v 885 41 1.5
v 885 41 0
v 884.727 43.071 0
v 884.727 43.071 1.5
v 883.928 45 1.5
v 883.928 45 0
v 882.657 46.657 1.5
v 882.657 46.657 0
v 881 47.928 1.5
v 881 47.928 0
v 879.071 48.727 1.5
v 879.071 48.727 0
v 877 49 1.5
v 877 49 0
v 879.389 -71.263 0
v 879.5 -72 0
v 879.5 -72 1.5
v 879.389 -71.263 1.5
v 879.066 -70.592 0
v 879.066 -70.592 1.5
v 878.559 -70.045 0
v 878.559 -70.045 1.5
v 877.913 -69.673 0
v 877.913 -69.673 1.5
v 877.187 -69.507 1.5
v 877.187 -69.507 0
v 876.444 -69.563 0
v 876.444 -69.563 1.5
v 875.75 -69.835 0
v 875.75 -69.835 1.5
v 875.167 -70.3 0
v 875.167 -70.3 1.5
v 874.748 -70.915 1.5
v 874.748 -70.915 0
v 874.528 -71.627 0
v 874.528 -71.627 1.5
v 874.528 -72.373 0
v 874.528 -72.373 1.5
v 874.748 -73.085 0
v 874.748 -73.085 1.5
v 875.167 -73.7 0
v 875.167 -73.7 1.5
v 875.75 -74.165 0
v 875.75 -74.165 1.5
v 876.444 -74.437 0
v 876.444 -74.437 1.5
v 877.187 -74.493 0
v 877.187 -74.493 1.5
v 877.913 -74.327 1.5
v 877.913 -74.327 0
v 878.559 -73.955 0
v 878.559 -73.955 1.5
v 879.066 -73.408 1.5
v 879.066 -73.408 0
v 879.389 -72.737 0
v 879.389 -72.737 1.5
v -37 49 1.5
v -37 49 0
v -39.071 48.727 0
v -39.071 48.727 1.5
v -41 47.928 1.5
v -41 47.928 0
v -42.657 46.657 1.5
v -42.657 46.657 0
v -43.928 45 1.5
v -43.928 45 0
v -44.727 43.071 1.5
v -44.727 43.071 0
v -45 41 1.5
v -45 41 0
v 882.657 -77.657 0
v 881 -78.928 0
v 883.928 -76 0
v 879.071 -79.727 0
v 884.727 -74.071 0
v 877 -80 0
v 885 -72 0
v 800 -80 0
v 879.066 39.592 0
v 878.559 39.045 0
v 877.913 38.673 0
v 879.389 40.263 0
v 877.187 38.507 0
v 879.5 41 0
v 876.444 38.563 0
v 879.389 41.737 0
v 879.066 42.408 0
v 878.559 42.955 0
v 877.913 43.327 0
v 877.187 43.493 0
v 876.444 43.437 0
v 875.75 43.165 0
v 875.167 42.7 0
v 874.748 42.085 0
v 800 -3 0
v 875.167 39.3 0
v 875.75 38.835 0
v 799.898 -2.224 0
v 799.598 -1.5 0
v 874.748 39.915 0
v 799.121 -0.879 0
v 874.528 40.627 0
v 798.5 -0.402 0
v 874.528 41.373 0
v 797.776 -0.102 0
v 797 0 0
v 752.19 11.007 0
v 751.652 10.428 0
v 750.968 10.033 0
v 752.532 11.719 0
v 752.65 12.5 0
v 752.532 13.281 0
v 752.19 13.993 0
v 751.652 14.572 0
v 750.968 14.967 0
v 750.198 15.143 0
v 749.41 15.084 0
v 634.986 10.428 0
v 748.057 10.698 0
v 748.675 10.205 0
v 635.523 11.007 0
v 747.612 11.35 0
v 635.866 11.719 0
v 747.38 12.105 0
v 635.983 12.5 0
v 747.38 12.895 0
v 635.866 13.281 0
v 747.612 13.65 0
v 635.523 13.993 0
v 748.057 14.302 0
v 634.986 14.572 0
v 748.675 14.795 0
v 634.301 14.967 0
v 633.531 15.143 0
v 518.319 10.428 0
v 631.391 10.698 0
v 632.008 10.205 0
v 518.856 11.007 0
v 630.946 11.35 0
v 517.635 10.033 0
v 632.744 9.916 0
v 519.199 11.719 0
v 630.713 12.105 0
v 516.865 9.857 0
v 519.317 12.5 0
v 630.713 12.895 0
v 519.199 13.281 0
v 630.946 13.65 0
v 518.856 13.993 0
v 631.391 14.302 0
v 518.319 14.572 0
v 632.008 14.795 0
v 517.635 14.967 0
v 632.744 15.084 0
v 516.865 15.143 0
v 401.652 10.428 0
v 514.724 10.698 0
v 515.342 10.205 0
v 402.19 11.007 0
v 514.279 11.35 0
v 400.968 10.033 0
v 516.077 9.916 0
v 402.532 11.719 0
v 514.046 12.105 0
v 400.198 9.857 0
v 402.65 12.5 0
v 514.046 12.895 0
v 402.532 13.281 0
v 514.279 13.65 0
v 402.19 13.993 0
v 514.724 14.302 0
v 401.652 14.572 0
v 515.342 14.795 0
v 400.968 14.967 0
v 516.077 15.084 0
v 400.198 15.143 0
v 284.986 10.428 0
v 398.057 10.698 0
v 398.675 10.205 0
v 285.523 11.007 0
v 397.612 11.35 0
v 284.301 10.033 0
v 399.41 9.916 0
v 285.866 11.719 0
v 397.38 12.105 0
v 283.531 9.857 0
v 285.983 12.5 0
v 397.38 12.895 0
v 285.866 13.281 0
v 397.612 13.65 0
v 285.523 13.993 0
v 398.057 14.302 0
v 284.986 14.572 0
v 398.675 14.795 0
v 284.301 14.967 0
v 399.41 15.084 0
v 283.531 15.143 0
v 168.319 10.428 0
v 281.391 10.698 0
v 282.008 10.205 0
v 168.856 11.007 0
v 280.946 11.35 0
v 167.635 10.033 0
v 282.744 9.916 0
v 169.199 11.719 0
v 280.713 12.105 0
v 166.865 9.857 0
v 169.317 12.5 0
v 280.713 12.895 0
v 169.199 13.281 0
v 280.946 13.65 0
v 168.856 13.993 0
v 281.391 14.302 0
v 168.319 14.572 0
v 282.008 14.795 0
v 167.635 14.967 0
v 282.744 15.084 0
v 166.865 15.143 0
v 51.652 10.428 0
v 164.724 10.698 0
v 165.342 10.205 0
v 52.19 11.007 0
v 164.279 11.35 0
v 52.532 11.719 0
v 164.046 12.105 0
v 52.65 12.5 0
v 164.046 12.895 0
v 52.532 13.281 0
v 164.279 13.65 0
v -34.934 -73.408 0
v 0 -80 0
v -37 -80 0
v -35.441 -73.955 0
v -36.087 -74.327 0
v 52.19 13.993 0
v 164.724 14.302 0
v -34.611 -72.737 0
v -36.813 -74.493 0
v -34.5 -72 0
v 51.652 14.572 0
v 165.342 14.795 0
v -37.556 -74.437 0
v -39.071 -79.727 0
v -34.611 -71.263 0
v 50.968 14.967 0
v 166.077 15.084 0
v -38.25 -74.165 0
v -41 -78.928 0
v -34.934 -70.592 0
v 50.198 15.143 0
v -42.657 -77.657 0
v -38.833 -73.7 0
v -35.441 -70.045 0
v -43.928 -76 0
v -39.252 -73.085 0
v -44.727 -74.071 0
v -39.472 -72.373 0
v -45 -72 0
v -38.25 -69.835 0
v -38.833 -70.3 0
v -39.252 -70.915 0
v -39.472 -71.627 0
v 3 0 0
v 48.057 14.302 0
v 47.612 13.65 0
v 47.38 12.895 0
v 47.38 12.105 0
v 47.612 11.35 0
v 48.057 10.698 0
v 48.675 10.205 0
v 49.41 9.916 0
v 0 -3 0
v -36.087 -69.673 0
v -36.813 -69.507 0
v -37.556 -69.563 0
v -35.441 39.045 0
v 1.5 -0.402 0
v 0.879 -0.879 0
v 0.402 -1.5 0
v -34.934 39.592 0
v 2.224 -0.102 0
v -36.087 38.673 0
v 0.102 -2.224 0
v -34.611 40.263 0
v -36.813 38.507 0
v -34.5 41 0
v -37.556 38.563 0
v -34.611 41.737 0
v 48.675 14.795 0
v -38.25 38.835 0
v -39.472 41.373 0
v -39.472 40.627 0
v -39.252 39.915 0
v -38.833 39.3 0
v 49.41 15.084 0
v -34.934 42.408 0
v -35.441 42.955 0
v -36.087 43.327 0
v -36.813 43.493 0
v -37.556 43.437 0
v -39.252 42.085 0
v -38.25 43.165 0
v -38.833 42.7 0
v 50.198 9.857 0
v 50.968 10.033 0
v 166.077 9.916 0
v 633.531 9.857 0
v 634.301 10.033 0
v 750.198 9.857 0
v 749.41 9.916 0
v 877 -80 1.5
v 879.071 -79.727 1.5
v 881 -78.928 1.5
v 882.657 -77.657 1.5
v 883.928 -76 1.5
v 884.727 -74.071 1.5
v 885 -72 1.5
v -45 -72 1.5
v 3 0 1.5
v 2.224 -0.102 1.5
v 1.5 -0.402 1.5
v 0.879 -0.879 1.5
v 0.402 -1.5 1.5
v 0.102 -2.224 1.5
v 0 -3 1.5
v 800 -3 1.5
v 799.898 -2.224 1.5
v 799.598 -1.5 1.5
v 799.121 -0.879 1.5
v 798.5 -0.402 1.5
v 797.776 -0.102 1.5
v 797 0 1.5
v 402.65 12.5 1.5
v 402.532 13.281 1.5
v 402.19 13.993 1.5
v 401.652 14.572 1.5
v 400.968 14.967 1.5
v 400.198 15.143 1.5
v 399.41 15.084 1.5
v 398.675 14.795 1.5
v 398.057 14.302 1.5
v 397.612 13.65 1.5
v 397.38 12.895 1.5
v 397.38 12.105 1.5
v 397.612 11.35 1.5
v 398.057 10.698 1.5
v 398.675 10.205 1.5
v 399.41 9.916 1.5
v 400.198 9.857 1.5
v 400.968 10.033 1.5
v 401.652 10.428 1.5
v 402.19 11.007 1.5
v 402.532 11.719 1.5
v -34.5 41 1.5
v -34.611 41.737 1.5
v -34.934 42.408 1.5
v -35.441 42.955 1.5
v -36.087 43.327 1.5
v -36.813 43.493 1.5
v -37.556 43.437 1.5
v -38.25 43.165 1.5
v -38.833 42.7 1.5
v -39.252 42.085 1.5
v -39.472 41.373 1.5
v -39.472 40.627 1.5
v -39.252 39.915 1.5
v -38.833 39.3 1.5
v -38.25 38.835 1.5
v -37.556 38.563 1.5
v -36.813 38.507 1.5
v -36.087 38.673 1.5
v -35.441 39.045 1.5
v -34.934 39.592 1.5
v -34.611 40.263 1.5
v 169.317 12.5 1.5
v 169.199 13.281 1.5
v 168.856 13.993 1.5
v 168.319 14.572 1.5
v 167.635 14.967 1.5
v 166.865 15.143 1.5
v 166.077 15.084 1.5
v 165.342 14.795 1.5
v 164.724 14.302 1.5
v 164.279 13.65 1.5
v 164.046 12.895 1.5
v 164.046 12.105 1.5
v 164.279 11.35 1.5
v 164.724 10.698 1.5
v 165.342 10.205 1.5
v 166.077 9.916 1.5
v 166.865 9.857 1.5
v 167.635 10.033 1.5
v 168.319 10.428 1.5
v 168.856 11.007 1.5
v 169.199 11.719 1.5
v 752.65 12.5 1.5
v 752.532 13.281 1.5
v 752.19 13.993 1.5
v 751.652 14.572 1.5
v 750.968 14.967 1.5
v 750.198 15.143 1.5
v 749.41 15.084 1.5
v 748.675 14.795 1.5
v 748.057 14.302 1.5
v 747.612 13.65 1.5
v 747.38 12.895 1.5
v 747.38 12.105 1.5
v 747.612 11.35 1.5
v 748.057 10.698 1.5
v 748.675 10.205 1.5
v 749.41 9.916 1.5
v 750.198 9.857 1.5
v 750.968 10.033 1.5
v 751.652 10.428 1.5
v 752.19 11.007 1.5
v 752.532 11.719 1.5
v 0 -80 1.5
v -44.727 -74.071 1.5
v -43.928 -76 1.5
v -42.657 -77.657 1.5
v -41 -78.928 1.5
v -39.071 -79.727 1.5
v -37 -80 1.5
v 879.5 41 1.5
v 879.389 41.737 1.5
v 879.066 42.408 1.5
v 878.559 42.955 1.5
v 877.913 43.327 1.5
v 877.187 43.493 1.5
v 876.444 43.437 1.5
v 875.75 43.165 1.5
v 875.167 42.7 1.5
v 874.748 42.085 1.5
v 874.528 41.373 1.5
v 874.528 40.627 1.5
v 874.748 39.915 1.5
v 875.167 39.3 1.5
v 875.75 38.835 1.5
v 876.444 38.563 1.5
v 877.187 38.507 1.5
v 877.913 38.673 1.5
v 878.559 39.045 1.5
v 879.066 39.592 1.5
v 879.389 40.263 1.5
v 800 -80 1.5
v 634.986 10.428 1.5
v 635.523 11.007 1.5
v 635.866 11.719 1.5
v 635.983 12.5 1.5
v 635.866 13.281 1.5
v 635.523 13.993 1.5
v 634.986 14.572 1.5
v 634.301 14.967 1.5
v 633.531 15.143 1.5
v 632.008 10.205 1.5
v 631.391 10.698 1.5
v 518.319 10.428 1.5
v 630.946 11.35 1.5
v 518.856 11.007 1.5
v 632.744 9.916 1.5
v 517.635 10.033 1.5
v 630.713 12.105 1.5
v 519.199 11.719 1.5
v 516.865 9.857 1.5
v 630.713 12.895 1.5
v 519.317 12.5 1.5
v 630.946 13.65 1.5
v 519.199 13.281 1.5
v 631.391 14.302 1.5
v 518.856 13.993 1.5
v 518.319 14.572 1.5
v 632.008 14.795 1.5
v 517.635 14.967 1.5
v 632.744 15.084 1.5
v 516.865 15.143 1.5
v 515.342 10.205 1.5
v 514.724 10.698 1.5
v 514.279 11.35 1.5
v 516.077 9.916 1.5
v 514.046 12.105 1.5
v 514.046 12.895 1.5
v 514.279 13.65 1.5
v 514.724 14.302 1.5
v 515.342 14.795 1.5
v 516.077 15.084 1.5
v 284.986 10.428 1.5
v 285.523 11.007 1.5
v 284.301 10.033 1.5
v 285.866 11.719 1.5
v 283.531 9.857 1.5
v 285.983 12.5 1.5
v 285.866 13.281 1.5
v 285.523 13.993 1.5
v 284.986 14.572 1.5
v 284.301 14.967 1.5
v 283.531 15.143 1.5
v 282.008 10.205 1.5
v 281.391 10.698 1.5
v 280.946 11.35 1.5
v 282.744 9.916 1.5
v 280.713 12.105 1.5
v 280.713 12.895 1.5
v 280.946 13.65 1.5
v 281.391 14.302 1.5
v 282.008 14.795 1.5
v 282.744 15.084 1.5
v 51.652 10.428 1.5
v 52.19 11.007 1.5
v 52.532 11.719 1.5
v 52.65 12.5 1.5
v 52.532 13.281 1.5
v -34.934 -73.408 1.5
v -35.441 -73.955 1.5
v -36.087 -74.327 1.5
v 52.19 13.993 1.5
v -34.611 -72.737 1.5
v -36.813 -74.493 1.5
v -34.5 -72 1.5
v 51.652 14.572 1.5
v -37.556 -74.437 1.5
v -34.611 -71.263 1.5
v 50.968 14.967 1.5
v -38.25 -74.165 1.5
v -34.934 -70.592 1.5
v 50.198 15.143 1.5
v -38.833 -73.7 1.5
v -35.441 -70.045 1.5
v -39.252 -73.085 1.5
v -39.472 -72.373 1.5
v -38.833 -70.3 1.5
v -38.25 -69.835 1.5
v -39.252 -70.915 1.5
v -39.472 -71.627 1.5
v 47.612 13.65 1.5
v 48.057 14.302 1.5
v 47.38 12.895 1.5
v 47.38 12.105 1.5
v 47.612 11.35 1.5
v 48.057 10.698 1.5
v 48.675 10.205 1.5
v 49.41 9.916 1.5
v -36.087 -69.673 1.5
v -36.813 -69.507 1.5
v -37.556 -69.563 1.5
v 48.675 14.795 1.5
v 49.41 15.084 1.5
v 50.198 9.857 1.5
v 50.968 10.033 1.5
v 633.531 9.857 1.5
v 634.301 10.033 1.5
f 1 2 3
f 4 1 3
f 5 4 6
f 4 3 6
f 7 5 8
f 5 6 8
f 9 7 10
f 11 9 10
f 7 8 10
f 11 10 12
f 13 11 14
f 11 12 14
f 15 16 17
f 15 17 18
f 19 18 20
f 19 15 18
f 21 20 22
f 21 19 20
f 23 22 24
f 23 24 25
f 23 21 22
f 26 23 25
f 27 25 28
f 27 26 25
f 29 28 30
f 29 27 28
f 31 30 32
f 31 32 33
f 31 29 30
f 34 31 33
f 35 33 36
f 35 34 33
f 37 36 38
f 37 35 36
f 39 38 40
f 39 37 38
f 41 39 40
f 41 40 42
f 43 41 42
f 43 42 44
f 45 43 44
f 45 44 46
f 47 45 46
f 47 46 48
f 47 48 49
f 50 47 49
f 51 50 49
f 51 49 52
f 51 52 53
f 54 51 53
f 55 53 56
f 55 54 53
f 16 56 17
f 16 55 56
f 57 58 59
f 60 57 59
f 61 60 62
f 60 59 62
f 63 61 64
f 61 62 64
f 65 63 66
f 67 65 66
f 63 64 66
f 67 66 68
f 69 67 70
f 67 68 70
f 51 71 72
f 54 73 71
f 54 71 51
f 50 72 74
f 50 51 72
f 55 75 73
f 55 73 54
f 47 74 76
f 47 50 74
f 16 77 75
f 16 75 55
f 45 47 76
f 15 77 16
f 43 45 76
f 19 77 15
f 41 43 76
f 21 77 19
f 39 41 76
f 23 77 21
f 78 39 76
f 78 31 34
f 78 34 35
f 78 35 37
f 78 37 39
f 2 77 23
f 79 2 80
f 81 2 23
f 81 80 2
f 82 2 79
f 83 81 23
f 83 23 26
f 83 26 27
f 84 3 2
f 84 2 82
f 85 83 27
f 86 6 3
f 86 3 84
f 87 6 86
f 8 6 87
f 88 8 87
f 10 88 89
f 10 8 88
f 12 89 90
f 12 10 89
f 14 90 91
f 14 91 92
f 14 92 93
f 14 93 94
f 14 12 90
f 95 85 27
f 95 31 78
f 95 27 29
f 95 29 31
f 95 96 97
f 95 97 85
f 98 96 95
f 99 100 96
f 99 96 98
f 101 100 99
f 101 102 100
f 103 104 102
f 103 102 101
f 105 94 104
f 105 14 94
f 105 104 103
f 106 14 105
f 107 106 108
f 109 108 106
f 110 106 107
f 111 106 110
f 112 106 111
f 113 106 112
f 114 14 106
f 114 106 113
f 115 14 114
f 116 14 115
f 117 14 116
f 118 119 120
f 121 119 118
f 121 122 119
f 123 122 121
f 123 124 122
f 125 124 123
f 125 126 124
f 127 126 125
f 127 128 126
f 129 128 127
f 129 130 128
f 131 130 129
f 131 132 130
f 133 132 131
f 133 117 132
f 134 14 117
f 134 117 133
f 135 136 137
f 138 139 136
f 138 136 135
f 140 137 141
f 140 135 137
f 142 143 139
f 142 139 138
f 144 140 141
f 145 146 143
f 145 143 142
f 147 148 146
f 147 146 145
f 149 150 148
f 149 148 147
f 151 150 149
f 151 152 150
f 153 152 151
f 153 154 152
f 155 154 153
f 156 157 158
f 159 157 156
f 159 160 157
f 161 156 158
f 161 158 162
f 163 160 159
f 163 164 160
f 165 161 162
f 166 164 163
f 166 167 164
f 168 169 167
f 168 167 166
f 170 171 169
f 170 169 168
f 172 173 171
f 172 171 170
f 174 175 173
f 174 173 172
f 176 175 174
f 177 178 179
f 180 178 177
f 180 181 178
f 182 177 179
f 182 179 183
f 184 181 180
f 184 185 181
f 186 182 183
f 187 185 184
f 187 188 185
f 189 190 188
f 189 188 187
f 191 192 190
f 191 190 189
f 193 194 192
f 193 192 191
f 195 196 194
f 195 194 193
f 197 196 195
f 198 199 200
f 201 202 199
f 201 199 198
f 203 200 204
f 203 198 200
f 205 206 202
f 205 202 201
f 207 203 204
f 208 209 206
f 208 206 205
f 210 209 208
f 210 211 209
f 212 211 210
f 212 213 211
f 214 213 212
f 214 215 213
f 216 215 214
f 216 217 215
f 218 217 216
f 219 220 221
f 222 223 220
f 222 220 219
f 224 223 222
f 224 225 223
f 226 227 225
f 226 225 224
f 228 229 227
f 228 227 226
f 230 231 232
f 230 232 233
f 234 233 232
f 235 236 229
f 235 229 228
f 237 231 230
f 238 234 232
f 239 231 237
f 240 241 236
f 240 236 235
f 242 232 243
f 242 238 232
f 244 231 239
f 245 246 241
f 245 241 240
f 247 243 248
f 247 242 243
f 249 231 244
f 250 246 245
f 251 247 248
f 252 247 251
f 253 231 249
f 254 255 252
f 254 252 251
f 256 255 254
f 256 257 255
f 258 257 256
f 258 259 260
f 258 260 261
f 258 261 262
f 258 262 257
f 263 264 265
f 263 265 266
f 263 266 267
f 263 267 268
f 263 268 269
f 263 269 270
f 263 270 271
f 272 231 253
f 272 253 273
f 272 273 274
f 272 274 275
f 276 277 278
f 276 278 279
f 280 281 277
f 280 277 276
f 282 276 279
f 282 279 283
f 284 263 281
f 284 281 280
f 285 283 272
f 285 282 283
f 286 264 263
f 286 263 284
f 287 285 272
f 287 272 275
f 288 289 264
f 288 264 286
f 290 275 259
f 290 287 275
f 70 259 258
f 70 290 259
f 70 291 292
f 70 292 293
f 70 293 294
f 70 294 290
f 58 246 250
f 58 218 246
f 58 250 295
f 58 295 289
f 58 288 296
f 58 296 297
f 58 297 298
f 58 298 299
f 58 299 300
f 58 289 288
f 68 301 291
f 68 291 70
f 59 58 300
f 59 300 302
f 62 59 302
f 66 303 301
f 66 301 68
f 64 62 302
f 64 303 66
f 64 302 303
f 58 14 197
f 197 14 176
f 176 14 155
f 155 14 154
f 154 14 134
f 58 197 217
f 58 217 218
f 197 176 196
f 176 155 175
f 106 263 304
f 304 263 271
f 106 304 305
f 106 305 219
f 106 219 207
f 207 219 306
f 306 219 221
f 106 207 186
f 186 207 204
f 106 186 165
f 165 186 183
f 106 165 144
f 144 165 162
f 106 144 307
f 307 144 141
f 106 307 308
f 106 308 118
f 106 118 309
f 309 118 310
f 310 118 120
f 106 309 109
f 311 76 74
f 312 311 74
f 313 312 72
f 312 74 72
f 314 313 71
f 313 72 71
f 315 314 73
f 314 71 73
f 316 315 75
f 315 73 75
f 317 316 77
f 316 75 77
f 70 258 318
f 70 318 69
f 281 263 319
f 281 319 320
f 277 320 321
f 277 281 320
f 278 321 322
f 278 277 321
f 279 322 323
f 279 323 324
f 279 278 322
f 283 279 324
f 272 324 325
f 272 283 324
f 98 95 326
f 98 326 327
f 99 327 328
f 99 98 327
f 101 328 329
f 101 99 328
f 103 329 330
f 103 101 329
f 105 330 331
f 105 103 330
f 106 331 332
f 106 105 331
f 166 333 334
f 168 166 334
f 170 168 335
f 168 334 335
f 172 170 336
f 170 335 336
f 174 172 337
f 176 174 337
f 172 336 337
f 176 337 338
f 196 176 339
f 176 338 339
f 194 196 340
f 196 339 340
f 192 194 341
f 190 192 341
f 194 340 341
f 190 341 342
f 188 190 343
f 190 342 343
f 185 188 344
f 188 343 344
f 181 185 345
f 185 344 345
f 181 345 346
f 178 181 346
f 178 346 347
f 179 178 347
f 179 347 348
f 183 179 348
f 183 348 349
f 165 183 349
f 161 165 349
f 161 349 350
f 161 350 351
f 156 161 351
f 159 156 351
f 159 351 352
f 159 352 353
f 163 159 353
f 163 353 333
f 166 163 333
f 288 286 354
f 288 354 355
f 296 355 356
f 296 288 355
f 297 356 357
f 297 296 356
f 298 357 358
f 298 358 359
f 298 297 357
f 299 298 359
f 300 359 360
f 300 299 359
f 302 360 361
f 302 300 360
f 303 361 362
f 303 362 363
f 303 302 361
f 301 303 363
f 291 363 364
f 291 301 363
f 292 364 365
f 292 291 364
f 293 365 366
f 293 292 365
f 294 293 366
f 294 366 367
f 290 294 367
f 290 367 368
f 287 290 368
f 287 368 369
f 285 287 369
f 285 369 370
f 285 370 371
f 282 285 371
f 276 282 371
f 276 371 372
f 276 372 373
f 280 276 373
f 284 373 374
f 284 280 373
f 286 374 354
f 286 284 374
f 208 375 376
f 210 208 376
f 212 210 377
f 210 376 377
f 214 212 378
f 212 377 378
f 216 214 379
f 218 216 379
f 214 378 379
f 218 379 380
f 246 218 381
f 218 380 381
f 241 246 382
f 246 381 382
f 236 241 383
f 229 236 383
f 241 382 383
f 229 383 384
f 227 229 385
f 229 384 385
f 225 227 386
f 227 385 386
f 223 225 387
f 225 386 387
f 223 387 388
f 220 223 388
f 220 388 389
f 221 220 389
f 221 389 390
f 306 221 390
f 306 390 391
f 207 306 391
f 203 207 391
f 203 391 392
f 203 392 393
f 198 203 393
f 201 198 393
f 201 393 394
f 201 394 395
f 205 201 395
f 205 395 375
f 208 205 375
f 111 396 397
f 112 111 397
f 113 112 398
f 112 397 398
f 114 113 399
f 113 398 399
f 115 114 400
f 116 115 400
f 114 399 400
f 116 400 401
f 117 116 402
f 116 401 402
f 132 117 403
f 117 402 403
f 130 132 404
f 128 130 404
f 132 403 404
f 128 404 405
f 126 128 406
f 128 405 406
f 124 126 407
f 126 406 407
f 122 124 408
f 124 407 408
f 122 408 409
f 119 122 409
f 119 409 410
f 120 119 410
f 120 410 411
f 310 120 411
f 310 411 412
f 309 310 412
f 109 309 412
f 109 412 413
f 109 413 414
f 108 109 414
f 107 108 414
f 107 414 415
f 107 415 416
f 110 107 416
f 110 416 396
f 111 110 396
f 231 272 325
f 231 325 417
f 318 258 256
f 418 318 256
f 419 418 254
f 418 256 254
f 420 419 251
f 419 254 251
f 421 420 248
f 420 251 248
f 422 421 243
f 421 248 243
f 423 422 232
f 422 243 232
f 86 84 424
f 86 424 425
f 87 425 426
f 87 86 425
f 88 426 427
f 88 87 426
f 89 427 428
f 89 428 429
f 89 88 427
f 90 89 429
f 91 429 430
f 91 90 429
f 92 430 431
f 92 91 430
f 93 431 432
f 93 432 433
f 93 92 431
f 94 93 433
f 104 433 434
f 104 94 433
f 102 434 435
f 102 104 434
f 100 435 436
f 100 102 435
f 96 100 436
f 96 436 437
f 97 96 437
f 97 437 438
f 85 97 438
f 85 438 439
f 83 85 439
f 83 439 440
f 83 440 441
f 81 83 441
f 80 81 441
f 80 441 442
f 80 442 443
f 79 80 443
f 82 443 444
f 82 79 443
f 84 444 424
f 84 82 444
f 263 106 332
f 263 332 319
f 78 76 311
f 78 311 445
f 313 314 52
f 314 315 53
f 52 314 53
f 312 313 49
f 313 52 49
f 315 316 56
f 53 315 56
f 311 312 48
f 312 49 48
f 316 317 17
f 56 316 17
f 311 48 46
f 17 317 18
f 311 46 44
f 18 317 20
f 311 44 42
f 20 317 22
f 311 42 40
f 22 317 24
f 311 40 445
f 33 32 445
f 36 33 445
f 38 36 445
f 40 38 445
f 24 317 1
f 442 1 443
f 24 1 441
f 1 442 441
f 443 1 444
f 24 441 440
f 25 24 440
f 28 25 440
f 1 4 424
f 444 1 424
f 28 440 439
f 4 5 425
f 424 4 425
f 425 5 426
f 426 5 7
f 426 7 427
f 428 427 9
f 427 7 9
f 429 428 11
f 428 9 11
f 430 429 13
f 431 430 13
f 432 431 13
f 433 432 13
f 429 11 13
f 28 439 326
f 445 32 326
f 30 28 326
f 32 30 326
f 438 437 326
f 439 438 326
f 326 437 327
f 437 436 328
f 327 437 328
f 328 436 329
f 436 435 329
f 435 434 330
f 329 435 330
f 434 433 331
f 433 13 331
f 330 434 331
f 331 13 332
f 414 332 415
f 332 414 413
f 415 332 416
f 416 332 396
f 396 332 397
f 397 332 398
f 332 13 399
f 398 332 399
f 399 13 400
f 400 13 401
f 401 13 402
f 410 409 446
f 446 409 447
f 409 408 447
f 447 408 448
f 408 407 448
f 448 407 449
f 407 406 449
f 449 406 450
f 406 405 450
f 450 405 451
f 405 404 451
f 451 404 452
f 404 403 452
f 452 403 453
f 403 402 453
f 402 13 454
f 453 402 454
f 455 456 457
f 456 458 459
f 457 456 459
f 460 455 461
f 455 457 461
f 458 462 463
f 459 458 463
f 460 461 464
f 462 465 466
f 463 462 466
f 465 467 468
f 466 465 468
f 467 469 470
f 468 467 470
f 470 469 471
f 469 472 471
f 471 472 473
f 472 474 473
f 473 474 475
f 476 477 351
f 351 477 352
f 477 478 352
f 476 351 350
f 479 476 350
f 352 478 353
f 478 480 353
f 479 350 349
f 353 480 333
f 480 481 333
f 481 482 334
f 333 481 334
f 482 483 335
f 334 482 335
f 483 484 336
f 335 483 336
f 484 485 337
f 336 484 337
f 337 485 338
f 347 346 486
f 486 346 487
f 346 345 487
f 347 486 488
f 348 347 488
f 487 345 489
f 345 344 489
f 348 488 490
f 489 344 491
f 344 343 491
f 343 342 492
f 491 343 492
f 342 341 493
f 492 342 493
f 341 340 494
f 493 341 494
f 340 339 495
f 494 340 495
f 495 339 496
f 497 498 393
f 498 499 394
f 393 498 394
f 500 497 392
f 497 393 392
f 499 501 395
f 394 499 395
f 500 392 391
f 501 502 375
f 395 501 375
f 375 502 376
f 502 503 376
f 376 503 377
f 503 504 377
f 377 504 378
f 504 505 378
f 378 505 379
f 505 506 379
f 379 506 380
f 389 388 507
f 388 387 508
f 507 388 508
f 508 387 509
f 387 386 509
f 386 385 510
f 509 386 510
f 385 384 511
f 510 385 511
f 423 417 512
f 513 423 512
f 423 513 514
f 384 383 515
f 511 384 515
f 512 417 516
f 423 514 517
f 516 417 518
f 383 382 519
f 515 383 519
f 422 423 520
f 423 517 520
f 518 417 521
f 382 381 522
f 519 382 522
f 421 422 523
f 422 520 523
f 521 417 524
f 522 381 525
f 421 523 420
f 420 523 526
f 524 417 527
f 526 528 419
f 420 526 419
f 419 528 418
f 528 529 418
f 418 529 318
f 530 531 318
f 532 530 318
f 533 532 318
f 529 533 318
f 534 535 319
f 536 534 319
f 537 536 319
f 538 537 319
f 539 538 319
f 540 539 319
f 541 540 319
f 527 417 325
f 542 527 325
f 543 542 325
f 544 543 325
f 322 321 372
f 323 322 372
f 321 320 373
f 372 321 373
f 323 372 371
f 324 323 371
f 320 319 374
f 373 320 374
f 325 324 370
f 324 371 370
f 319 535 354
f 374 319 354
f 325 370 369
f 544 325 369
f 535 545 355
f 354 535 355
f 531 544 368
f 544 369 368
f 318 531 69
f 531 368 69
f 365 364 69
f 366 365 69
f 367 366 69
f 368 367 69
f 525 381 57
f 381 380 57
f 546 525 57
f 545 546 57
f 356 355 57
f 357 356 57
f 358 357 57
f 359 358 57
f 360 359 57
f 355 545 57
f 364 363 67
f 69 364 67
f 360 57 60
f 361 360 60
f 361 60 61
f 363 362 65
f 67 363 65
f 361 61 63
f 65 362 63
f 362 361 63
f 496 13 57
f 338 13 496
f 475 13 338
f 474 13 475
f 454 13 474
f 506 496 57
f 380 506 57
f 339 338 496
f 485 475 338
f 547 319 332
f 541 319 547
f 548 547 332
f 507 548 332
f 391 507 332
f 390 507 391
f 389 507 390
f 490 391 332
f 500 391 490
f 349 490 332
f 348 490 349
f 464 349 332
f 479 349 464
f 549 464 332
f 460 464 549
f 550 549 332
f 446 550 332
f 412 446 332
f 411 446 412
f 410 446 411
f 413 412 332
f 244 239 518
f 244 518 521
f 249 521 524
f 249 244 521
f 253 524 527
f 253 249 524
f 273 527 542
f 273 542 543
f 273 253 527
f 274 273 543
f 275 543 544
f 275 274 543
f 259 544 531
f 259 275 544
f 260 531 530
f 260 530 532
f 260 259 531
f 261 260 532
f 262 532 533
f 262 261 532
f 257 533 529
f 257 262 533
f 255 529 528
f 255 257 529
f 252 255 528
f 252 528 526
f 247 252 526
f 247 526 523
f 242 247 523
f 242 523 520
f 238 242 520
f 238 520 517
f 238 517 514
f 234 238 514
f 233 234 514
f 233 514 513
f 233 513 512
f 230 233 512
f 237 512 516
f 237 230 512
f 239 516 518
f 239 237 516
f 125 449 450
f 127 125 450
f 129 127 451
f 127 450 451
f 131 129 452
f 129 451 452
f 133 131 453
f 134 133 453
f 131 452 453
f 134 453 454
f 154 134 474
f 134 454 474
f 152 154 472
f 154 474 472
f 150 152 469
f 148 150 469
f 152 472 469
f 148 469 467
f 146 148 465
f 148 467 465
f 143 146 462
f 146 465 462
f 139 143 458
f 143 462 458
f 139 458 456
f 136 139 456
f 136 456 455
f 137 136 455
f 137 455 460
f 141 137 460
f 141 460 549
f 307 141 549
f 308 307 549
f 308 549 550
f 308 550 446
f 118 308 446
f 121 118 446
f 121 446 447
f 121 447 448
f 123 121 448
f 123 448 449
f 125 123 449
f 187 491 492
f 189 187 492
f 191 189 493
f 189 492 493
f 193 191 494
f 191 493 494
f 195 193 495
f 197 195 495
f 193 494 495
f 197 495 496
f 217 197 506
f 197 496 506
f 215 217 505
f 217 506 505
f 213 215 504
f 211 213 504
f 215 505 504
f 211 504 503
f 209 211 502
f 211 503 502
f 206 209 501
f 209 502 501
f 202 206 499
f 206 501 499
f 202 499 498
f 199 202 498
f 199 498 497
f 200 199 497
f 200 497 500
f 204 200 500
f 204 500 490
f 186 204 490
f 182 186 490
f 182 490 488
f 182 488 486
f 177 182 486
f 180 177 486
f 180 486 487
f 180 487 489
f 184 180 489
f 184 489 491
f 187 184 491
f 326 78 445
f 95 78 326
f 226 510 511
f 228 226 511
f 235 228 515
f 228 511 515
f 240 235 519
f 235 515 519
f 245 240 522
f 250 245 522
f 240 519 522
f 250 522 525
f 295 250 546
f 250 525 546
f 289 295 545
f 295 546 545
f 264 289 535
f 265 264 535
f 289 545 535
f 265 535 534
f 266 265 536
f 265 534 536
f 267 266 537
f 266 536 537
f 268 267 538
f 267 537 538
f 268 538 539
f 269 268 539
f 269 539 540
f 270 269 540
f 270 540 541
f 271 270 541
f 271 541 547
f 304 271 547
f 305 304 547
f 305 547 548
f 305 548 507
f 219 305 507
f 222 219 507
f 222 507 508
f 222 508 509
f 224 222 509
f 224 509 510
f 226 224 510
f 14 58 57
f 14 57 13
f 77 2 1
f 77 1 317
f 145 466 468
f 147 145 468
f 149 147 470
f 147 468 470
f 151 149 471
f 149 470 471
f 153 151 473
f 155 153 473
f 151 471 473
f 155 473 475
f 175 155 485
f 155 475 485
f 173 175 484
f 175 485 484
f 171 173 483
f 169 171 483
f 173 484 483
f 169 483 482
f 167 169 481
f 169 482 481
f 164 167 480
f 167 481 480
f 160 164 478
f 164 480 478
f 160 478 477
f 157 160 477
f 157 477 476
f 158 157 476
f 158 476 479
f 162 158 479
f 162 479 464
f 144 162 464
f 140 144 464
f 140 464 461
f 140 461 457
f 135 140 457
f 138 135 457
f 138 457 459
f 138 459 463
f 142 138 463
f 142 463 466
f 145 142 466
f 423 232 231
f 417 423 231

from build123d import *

# Parameters (mm, degrees)
SKETCH_R            = 2.5
PAD_DEPTH           = 1.5
SKETCH001_R         = 2.65
HOLE_DEPTH          = 25
LINEARPATTERN_COUNT = 7
LINEARPATTERN_PITCH = 116.666667


with BuildPart() as part:
    # Sketch → Pad (new body)
    with BuildSketch(Plane.XY):
        with BuildLine():
            Line((0, -3), (0, -80))
            Line((-37, -80), (0, -80))
            ThreePointArc((-45, -72), (-42.656854, -77.656854), (-37, -80))
            Line((-45, -72), (-45, 41))
            ThreePointArc((-37, 49), (-42.656854, 46.656854), (-45, 41))
            Line((-37, 49), (877, 49))
            ThreePointArc((885, 41), (882.656854, 46.656854), (877, 49))
            Line((885, 41), (885, -72))
            ThreePointArc((877, -80), (882.656854, -77.656854), (885, -72))
            Line((877, -80), (800, -80))
            Line((800, -80), (800, -3))
            ThreePointArc((800, -3), (799.12132, -0.87868), (797, 0))
            Line((797, 0), (3, 0))
            ThreePointArc((3, 0), (0.87868, -0.87868), (0, -3))
        make_face()
        with Locations((-37, 41)):
            Circle(SKETCH_R, mode=Mode.SUBTRACT)
        with Locations((-37, -72)):
            Circle(SKETCH_R, mode=Mode.SUBTRACT)
        with Locations((877, -72)):
            Circle(SKETCH_R, mode=Mode.SUBTRACT)
        with Locations((877, 41)):
            Circle(SKETCH_R, mode=Mode.SUBTRACT)
    extrude(amount=PAD_DEPTH)

    # Sketch001 → Hole (cut)
    with BuildSketch(Plane.XY.offset(2)):
        with Locations((50, 12.5)):
            Circle(SKETCH001_R)
    hole = extrude(amount=-HOLE_DEPTH, mode=Mode.SUBTRACT)

    # LinearPattern: Hole ×7
    with Locations(*[(i * LINEARPATTERN_PITCH, 0, 0) for i in range(1, LINEARPATTERN_COUNT)]):
        add(hole, mode=Mode.SUBTRACT)


solid = part.part
